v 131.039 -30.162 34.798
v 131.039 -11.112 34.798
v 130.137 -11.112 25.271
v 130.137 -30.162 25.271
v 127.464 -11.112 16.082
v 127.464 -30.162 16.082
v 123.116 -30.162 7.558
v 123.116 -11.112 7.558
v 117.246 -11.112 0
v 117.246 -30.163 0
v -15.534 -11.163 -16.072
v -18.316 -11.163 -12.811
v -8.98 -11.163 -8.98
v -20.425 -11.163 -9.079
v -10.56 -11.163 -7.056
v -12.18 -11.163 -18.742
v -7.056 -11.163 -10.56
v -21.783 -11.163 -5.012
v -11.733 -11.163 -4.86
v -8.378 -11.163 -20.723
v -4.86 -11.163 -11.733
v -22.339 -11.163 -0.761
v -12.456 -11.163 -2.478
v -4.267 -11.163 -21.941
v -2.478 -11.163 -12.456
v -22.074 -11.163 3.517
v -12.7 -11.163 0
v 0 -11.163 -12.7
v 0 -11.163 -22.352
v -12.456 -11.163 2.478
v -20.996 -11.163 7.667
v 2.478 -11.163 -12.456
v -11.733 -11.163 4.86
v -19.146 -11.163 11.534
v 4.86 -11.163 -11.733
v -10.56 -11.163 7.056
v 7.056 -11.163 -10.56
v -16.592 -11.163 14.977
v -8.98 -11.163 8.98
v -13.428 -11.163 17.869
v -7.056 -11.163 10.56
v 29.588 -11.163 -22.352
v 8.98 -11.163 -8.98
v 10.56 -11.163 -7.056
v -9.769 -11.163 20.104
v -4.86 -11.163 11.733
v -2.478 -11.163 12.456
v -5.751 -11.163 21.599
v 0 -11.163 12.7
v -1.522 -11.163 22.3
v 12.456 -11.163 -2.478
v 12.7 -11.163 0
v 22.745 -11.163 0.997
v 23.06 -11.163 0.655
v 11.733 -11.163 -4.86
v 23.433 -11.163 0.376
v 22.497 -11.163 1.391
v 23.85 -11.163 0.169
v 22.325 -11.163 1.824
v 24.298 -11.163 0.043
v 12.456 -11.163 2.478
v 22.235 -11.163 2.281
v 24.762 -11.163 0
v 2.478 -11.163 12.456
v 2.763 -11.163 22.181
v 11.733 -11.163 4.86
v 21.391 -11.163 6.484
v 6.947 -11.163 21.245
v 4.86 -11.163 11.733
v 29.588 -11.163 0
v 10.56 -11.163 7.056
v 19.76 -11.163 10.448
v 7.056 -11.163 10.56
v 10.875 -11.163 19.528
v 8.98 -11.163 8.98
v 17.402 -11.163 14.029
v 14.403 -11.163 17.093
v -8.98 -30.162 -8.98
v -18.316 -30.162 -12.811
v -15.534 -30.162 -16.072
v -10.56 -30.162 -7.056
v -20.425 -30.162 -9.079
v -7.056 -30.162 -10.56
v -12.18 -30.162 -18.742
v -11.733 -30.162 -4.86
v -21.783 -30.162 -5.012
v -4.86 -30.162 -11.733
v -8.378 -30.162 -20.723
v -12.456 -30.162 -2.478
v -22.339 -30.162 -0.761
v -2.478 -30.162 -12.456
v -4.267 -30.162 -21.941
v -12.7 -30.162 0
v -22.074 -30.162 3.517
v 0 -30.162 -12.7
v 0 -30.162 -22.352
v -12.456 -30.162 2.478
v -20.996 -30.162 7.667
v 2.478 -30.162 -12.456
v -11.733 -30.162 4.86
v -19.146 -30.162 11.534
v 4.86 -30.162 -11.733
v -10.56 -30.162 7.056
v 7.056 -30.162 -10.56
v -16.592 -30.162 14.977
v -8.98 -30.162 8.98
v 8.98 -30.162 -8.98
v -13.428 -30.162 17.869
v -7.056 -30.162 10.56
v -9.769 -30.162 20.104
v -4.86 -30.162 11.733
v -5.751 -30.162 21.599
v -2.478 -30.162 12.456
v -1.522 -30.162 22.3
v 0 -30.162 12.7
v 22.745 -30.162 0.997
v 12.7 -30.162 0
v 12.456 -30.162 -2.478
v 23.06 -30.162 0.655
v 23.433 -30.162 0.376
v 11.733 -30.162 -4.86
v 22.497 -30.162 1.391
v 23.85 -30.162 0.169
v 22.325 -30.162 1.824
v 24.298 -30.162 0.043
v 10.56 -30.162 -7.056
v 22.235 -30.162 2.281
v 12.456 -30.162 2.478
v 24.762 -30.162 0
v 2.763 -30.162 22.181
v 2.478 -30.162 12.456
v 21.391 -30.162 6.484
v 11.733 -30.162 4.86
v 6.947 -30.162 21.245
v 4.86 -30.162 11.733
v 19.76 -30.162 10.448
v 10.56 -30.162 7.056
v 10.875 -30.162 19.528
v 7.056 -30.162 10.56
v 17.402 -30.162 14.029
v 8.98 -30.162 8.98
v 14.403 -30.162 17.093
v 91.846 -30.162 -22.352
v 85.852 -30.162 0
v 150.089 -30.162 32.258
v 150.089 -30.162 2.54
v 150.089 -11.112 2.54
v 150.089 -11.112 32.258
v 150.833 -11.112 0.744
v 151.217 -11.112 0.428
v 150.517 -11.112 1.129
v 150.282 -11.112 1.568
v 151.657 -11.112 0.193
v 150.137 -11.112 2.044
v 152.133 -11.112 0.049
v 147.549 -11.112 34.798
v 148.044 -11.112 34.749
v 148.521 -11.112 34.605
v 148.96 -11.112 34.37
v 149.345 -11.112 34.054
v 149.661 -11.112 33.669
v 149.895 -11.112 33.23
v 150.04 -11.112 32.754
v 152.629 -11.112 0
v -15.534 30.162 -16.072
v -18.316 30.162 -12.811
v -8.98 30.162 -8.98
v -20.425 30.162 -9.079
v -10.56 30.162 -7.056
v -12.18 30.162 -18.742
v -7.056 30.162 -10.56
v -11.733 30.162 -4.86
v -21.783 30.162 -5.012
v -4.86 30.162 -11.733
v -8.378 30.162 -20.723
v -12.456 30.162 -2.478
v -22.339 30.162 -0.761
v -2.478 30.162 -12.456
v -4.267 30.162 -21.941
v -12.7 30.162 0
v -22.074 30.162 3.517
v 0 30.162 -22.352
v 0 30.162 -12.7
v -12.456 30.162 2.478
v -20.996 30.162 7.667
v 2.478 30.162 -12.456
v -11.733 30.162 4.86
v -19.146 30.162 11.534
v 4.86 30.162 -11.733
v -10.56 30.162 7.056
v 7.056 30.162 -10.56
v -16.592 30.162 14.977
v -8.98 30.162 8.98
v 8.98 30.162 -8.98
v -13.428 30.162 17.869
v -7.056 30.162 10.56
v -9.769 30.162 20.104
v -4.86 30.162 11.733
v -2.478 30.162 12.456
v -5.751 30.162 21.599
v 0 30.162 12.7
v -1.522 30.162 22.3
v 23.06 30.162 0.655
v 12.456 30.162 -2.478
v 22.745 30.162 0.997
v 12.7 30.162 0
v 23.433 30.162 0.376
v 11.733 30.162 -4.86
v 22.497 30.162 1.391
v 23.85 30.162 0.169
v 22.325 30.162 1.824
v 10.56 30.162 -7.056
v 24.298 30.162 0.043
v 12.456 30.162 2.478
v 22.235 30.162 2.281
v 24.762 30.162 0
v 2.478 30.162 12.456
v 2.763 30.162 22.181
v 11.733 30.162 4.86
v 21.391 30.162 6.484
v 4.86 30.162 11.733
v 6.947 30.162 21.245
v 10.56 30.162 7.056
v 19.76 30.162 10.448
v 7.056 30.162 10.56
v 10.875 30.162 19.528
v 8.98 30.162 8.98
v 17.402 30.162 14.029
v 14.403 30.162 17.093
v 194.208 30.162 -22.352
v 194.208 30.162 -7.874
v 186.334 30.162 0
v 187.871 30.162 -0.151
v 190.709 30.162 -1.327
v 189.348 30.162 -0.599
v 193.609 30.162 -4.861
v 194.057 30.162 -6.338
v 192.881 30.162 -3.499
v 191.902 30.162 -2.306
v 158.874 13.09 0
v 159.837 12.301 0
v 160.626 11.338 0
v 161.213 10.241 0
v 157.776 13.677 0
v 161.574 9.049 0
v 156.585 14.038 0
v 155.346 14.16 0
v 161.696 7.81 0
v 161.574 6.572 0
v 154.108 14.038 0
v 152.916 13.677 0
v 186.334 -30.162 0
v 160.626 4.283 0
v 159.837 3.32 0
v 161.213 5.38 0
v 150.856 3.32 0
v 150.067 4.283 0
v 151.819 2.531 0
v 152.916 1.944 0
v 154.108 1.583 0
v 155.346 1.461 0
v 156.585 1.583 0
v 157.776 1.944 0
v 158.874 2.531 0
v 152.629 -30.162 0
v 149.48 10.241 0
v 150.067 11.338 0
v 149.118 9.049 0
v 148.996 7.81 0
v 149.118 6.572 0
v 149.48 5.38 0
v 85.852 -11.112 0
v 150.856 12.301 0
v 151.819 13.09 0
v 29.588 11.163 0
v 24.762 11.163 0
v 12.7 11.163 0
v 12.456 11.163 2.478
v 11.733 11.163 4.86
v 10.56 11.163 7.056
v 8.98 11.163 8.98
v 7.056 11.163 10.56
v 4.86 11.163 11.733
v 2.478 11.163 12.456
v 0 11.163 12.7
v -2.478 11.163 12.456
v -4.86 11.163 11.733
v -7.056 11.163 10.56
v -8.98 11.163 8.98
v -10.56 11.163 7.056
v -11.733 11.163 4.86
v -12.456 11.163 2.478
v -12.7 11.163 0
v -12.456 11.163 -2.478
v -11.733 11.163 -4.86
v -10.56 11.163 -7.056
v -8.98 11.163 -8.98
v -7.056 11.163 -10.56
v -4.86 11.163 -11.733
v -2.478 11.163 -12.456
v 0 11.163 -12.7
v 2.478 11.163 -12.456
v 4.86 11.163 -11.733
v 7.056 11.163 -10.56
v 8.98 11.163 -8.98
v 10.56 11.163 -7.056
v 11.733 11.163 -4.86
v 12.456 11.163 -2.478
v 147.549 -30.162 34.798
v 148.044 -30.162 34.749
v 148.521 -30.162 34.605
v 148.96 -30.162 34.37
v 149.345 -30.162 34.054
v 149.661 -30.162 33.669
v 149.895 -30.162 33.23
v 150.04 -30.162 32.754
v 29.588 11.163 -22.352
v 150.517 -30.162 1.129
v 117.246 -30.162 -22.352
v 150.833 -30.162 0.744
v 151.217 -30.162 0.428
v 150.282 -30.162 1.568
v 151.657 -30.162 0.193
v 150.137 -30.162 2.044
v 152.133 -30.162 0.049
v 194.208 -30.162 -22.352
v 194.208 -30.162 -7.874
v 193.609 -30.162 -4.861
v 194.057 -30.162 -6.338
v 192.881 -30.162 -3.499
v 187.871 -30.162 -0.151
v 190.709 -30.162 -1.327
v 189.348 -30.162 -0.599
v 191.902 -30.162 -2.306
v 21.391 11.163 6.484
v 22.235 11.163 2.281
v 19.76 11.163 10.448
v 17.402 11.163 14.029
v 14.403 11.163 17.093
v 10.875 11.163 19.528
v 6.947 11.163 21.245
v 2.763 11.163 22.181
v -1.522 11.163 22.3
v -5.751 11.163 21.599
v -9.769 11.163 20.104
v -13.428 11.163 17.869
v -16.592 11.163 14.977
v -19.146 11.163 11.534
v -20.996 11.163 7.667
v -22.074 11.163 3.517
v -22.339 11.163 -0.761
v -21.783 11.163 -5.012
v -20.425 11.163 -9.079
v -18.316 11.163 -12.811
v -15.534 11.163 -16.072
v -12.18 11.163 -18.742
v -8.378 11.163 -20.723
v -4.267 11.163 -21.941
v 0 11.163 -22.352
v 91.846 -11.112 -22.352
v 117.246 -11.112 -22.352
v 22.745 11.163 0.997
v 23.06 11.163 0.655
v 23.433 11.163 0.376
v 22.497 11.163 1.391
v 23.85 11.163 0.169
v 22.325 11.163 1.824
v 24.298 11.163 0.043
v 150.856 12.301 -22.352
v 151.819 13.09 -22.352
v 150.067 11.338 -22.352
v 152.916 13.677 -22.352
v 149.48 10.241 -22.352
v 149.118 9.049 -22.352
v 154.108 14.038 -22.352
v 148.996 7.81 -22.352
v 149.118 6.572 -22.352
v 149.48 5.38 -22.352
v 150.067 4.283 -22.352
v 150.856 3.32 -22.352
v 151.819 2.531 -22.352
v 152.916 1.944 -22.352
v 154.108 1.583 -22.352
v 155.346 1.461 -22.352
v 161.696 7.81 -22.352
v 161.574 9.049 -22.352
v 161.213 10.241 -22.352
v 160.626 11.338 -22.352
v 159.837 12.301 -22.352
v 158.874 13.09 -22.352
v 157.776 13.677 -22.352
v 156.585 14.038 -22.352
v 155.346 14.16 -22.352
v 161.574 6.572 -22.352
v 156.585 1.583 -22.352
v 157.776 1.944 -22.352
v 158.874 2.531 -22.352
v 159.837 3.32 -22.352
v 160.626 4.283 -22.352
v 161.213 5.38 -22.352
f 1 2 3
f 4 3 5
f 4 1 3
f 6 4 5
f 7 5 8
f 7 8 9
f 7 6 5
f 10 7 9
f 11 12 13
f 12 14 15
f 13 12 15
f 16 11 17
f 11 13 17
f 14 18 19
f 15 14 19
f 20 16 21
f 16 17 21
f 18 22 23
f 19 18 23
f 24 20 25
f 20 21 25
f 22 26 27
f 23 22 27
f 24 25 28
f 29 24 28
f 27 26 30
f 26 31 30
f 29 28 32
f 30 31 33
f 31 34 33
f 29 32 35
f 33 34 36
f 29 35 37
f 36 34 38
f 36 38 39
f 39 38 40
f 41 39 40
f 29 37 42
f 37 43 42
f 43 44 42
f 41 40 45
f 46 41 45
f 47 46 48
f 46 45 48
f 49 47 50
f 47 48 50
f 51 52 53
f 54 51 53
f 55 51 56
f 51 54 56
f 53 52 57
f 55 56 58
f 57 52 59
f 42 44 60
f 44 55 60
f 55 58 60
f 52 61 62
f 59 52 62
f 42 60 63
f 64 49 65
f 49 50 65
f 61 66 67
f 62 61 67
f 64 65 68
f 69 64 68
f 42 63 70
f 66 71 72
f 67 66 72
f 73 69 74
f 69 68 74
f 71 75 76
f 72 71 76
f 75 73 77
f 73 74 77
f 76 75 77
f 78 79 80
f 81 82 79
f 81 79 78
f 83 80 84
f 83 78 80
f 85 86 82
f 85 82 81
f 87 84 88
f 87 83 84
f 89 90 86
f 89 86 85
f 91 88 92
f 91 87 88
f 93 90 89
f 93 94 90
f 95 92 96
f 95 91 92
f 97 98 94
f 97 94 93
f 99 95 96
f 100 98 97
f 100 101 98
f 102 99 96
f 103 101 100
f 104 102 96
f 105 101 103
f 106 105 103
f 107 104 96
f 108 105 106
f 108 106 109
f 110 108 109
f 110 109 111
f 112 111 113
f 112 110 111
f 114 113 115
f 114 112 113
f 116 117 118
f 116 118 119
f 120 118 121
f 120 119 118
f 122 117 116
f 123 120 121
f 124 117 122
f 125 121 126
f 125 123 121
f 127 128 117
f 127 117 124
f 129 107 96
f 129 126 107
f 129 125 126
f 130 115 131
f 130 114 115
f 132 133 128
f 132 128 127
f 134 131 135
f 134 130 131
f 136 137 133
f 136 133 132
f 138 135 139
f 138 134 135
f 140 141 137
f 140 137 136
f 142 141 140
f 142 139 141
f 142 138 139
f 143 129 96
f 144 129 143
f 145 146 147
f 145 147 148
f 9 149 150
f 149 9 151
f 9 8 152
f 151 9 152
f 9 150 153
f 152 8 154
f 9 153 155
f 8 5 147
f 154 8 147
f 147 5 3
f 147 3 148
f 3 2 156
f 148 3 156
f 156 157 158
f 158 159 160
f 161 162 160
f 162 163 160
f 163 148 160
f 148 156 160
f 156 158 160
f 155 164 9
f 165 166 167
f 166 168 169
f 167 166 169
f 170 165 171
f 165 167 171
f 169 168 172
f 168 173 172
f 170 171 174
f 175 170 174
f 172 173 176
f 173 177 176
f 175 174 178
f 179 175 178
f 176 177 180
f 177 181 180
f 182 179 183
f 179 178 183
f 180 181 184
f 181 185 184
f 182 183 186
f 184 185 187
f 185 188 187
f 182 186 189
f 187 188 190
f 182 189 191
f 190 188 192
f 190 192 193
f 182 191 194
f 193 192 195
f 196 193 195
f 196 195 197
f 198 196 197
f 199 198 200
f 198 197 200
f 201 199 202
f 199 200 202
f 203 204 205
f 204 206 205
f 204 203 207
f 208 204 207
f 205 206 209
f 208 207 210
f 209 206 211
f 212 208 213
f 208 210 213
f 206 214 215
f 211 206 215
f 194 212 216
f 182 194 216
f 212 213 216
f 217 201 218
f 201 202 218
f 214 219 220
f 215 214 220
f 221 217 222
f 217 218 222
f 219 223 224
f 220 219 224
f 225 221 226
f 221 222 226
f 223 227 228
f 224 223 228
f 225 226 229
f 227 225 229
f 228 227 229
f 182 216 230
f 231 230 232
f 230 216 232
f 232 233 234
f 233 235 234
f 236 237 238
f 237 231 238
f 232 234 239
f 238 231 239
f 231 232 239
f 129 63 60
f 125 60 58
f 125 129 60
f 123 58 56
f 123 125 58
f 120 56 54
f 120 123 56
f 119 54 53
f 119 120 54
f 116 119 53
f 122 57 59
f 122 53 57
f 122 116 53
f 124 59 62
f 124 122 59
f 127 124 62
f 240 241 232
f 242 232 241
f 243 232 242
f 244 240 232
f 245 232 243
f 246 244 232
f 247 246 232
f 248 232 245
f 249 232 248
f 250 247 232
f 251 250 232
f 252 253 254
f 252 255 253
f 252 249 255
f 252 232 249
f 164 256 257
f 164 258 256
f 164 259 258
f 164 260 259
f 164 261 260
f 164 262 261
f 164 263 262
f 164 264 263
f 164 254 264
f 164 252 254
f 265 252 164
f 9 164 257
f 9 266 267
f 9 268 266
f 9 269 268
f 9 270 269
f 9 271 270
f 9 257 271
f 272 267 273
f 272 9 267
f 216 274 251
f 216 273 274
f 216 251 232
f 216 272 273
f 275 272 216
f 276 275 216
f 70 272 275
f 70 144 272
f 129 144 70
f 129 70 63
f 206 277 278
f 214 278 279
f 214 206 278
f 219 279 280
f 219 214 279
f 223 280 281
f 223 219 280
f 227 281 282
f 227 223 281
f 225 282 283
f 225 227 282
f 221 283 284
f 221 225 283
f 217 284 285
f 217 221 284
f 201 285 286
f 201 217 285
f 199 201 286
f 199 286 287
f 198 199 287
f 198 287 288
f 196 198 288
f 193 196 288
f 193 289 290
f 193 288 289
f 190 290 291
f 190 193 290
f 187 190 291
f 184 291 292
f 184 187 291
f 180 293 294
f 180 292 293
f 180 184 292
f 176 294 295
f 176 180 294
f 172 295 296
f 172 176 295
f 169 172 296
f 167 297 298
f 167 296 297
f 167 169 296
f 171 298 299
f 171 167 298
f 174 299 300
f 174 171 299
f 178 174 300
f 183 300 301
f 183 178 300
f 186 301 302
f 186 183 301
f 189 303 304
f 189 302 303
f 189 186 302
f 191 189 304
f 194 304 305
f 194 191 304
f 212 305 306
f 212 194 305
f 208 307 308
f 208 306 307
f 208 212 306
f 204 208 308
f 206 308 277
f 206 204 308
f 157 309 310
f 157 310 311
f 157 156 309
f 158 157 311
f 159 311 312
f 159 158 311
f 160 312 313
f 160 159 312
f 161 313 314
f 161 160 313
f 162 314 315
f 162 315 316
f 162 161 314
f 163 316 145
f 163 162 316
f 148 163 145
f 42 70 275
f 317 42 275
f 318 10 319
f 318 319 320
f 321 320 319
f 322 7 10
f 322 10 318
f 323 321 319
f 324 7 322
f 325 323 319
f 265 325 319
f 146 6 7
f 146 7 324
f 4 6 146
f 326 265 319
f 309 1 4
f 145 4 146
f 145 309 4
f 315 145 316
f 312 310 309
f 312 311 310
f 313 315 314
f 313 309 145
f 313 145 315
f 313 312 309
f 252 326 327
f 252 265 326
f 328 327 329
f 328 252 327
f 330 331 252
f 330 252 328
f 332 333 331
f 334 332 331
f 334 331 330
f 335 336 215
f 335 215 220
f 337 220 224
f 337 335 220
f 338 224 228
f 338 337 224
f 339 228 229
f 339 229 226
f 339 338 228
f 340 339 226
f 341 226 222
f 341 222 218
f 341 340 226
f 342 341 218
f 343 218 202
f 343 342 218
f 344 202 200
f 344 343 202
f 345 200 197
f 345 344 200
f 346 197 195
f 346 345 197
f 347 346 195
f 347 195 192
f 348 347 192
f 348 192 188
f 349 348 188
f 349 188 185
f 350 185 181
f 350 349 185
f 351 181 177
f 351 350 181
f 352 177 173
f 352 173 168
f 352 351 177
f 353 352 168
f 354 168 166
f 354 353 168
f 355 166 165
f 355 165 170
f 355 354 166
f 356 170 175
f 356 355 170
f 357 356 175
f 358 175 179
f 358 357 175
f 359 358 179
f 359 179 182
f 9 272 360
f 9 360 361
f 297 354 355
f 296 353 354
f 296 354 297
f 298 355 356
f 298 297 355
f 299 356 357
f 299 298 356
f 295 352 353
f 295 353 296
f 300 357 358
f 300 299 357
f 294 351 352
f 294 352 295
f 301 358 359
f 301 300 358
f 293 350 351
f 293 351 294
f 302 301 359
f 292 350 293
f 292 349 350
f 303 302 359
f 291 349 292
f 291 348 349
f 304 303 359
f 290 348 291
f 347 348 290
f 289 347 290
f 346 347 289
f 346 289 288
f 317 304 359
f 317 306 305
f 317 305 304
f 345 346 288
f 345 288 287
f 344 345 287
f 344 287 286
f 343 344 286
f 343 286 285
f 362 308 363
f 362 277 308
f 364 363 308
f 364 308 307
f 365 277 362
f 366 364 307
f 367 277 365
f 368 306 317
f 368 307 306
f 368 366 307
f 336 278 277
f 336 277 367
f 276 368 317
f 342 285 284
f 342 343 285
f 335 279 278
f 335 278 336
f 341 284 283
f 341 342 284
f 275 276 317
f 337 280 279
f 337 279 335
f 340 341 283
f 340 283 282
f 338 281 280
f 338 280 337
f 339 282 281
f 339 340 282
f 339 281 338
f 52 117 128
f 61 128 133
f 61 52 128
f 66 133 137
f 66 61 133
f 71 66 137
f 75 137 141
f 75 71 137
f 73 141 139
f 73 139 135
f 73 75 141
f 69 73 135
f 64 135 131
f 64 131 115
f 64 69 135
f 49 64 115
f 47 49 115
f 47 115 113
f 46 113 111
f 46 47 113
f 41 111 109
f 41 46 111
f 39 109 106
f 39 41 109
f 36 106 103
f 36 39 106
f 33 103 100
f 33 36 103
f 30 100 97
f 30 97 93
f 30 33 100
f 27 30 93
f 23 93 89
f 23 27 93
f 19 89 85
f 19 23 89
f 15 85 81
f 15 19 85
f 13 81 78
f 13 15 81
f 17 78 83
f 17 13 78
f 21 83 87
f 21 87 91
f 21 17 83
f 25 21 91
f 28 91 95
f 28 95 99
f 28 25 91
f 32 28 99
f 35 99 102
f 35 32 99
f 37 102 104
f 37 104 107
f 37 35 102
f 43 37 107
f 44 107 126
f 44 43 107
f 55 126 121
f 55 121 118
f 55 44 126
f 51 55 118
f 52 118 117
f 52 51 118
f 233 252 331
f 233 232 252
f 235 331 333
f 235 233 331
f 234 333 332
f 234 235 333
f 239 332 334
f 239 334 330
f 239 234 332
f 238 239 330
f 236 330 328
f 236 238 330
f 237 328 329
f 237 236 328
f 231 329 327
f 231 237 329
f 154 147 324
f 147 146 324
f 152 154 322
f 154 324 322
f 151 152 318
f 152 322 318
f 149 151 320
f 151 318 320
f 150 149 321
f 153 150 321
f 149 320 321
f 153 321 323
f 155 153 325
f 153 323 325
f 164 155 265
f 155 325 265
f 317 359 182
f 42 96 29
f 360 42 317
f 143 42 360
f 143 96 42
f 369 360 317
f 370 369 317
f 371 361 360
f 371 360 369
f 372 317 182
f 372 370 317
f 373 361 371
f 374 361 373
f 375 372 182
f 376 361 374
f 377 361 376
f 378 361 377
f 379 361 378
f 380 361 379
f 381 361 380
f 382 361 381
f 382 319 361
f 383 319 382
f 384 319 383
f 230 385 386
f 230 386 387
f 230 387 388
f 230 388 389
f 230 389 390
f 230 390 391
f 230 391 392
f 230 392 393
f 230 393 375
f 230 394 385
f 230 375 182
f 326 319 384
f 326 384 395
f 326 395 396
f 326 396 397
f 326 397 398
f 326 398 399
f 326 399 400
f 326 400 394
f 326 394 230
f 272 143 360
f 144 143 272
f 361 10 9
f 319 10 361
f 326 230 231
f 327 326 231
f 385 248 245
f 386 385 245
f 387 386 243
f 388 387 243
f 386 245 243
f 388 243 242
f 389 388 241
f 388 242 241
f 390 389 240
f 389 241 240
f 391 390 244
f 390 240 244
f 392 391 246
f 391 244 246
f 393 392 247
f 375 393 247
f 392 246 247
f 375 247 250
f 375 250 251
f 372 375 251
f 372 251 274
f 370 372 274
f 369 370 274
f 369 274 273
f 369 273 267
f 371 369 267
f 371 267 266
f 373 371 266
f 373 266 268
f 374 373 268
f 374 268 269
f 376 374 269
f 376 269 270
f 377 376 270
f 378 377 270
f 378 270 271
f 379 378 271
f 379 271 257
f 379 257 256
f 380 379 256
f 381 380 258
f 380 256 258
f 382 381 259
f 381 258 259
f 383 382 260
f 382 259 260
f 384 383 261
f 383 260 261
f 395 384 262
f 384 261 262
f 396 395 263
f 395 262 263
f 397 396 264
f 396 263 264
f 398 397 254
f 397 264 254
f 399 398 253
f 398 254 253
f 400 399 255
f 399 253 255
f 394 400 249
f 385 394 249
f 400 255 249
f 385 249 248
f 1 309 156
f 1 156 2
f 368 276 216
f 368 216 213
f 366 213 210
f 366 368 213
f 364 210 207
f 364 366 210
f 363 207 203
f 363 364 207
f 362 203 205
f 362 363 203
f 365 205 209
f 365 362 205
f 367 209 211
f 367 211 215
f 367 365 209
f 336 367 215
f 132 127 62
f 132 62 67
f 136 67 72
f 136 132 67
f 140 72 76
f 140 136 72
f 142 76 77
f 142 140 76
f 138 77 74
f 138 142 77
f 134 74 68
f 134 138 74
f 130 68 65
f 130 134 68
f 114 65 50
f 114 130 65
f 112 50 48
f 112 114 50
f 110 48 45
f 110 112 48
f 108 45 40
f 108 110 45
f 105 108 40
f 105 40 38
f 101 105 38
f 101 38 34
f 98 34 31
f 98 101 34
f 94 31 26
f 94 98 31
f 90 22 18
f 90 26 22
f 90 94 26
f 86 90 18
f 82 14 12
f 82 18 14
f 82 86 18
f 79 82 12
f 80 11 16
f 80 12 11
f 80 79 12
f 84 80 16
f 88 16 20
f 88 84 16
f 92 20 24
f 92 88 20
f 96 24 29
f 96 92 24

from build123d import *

# Parameters (mm, degrees)
F0_R      = 12.7
F1_DEPTH  = 30.1625
F2_R      = 7.874
F3_R      = 2.54
F4_DEPTH  = 30.1625
F5_DEPTH  = 19.05
F6_DEPTH  = 41.275
F8_R      = 2.54
F9_R      = 6.35
F10_DEPTH = 22.353
F11_W     = 59.1995969771
F11_H     = 22.3266
F12_DEPTH = 34.799
F13_DEPTH = 45.212


with BuildPart() as f1:
    # F0 (on Front) → F1 (new body, symmetric)
    with BuildSketch(Plane.XZ):
        with BuildLine():
            Line((85.852, 0), (22.352, 0))
            ThreePointArc((22.352, 0), (-15.8052507731, 15.8052507731), (0, -22.352))
            Line((0, -22.352), (91.8464, -22.352))
            Line((91.8464, -22.352), (85.852, 0))
        make_face()
        Circle(F0_R, mode=Mode.SUBTRACT)
    extrude(amount=F1_DEPTH, both=True)

    # F3
    f3_edges = [f1.edges().sort_by_distance(p)[0] for p in [
        (22.352, 0, 0),
    ]]
    fillet(f3_edges, radius=F3_R)


with BuildPart() as f1b:
    # F0 (on Front) → F1, piece 2 (new body, symmetric)
    with BuildSketch(Plane.XZ):
        Polygon((150.0886, 0), (117.2464, 0), (117.2464, -22.352), (194.2084, -22.352), (194.2084, 0), align=None)
    extrude(amount=F1_DEPTH, both=True)

    # F2
    f2_edges = [f1b.edges().sort_by_distance(p)[0] for p in [
        (194.2084, 0, 0),
    ]]
    fillet(f2_edges, radius=F2_R)


with BuildPart() as f4:
    # F0 (on Front) → F4 (new body, symmetric)
    with BuildSketch(Plane.XZ):
        Polygon((117.2464, 0), (85.852, 0), (91.8464, -22.352), (117.2464, -22.352), align=None)
    extrude(amount=F4_DEPTH, both=True)

    # F5 (cut): a face of the model
    f5_faces = [f4.faces().sort_by_distance(p)[0] for p in [
        (102.995076446, -30.1625, -10.7828073942),
    ]]
    extrude(f5_faces, amount=-F5_DEPTH, mode=Mode.SUBTRACT)


with BuildPart() as f4b:
    # F0 (on Front) → F4, piece 2 (new body, symmetric)
    with BuildSketch(Plane.XZ):
        with BuildLine():
            ThreePointArc((131.0386, 34.798), (127.4644153616, 16.0823576341), (117.2464, 0))
            Line((117.2464, 0), (150.0886, 0))
            Line((150.0886, 0), (150.0886, 34.798))
            Line((150.0886, 34.798), (131.0386, 34.798))
        make_face()
    extrude(amount=F4_DEPTH, both=True)

    # F6 (cut): a face of the model
    f6_faces = [f4b.faces().sort_by_distance(p)[0] for p in [
        (138.0621984193, 30.1625, 15.7456064231),
    ]]
    extrude(f6_faces, amount=-F6_DEPTH, mode=Mode.SUBTRACT)


with BuildPart() as f1b_1:
    add(f1b.part)

    # F7: union F4, F1, F4b
    add(f4.part)
    add(f1.part)
    add(f4b.part)

    # F8
    f8_edges = [f1b_1.edges().sort_by_distance(p)[0] for p in [
        (150.0886, -20.6375, 34.798),
        (150.0886, -20.6375, 0),
    ]]
    fillet(f8_edges, radius=F8_R)

    # F9 (on face) → F10 (cut, through all)
    with BuildSketch(Plane.XY):
        with Locations((155.3464, 7.8105)):
            Circle(F9_R)
    extrude(amount=-F10_DEPTH, mode=Mode.SUBTRACT)

    # F11 (on Top) → F12 (cut, through all)
    with BuildSketch(Plane.XY):
        with Locations((-0.0117294312, 0)):
            Rectangle(F11_W, F11_H)
    extrude(amount=F12_DEPTH, mode=Mode.SUBTRACT)

    # F11 (on Top) → F13 (cut)
    with BuildSketch(Plane.XY):
        with Locations((-0.0117294312, 0)):
            Rectangle(F11_W, F11_H)
    extrude(amount=-F13_DEPTH, mode=Mode.SUBTRACT)


solid = f1b_1.part
